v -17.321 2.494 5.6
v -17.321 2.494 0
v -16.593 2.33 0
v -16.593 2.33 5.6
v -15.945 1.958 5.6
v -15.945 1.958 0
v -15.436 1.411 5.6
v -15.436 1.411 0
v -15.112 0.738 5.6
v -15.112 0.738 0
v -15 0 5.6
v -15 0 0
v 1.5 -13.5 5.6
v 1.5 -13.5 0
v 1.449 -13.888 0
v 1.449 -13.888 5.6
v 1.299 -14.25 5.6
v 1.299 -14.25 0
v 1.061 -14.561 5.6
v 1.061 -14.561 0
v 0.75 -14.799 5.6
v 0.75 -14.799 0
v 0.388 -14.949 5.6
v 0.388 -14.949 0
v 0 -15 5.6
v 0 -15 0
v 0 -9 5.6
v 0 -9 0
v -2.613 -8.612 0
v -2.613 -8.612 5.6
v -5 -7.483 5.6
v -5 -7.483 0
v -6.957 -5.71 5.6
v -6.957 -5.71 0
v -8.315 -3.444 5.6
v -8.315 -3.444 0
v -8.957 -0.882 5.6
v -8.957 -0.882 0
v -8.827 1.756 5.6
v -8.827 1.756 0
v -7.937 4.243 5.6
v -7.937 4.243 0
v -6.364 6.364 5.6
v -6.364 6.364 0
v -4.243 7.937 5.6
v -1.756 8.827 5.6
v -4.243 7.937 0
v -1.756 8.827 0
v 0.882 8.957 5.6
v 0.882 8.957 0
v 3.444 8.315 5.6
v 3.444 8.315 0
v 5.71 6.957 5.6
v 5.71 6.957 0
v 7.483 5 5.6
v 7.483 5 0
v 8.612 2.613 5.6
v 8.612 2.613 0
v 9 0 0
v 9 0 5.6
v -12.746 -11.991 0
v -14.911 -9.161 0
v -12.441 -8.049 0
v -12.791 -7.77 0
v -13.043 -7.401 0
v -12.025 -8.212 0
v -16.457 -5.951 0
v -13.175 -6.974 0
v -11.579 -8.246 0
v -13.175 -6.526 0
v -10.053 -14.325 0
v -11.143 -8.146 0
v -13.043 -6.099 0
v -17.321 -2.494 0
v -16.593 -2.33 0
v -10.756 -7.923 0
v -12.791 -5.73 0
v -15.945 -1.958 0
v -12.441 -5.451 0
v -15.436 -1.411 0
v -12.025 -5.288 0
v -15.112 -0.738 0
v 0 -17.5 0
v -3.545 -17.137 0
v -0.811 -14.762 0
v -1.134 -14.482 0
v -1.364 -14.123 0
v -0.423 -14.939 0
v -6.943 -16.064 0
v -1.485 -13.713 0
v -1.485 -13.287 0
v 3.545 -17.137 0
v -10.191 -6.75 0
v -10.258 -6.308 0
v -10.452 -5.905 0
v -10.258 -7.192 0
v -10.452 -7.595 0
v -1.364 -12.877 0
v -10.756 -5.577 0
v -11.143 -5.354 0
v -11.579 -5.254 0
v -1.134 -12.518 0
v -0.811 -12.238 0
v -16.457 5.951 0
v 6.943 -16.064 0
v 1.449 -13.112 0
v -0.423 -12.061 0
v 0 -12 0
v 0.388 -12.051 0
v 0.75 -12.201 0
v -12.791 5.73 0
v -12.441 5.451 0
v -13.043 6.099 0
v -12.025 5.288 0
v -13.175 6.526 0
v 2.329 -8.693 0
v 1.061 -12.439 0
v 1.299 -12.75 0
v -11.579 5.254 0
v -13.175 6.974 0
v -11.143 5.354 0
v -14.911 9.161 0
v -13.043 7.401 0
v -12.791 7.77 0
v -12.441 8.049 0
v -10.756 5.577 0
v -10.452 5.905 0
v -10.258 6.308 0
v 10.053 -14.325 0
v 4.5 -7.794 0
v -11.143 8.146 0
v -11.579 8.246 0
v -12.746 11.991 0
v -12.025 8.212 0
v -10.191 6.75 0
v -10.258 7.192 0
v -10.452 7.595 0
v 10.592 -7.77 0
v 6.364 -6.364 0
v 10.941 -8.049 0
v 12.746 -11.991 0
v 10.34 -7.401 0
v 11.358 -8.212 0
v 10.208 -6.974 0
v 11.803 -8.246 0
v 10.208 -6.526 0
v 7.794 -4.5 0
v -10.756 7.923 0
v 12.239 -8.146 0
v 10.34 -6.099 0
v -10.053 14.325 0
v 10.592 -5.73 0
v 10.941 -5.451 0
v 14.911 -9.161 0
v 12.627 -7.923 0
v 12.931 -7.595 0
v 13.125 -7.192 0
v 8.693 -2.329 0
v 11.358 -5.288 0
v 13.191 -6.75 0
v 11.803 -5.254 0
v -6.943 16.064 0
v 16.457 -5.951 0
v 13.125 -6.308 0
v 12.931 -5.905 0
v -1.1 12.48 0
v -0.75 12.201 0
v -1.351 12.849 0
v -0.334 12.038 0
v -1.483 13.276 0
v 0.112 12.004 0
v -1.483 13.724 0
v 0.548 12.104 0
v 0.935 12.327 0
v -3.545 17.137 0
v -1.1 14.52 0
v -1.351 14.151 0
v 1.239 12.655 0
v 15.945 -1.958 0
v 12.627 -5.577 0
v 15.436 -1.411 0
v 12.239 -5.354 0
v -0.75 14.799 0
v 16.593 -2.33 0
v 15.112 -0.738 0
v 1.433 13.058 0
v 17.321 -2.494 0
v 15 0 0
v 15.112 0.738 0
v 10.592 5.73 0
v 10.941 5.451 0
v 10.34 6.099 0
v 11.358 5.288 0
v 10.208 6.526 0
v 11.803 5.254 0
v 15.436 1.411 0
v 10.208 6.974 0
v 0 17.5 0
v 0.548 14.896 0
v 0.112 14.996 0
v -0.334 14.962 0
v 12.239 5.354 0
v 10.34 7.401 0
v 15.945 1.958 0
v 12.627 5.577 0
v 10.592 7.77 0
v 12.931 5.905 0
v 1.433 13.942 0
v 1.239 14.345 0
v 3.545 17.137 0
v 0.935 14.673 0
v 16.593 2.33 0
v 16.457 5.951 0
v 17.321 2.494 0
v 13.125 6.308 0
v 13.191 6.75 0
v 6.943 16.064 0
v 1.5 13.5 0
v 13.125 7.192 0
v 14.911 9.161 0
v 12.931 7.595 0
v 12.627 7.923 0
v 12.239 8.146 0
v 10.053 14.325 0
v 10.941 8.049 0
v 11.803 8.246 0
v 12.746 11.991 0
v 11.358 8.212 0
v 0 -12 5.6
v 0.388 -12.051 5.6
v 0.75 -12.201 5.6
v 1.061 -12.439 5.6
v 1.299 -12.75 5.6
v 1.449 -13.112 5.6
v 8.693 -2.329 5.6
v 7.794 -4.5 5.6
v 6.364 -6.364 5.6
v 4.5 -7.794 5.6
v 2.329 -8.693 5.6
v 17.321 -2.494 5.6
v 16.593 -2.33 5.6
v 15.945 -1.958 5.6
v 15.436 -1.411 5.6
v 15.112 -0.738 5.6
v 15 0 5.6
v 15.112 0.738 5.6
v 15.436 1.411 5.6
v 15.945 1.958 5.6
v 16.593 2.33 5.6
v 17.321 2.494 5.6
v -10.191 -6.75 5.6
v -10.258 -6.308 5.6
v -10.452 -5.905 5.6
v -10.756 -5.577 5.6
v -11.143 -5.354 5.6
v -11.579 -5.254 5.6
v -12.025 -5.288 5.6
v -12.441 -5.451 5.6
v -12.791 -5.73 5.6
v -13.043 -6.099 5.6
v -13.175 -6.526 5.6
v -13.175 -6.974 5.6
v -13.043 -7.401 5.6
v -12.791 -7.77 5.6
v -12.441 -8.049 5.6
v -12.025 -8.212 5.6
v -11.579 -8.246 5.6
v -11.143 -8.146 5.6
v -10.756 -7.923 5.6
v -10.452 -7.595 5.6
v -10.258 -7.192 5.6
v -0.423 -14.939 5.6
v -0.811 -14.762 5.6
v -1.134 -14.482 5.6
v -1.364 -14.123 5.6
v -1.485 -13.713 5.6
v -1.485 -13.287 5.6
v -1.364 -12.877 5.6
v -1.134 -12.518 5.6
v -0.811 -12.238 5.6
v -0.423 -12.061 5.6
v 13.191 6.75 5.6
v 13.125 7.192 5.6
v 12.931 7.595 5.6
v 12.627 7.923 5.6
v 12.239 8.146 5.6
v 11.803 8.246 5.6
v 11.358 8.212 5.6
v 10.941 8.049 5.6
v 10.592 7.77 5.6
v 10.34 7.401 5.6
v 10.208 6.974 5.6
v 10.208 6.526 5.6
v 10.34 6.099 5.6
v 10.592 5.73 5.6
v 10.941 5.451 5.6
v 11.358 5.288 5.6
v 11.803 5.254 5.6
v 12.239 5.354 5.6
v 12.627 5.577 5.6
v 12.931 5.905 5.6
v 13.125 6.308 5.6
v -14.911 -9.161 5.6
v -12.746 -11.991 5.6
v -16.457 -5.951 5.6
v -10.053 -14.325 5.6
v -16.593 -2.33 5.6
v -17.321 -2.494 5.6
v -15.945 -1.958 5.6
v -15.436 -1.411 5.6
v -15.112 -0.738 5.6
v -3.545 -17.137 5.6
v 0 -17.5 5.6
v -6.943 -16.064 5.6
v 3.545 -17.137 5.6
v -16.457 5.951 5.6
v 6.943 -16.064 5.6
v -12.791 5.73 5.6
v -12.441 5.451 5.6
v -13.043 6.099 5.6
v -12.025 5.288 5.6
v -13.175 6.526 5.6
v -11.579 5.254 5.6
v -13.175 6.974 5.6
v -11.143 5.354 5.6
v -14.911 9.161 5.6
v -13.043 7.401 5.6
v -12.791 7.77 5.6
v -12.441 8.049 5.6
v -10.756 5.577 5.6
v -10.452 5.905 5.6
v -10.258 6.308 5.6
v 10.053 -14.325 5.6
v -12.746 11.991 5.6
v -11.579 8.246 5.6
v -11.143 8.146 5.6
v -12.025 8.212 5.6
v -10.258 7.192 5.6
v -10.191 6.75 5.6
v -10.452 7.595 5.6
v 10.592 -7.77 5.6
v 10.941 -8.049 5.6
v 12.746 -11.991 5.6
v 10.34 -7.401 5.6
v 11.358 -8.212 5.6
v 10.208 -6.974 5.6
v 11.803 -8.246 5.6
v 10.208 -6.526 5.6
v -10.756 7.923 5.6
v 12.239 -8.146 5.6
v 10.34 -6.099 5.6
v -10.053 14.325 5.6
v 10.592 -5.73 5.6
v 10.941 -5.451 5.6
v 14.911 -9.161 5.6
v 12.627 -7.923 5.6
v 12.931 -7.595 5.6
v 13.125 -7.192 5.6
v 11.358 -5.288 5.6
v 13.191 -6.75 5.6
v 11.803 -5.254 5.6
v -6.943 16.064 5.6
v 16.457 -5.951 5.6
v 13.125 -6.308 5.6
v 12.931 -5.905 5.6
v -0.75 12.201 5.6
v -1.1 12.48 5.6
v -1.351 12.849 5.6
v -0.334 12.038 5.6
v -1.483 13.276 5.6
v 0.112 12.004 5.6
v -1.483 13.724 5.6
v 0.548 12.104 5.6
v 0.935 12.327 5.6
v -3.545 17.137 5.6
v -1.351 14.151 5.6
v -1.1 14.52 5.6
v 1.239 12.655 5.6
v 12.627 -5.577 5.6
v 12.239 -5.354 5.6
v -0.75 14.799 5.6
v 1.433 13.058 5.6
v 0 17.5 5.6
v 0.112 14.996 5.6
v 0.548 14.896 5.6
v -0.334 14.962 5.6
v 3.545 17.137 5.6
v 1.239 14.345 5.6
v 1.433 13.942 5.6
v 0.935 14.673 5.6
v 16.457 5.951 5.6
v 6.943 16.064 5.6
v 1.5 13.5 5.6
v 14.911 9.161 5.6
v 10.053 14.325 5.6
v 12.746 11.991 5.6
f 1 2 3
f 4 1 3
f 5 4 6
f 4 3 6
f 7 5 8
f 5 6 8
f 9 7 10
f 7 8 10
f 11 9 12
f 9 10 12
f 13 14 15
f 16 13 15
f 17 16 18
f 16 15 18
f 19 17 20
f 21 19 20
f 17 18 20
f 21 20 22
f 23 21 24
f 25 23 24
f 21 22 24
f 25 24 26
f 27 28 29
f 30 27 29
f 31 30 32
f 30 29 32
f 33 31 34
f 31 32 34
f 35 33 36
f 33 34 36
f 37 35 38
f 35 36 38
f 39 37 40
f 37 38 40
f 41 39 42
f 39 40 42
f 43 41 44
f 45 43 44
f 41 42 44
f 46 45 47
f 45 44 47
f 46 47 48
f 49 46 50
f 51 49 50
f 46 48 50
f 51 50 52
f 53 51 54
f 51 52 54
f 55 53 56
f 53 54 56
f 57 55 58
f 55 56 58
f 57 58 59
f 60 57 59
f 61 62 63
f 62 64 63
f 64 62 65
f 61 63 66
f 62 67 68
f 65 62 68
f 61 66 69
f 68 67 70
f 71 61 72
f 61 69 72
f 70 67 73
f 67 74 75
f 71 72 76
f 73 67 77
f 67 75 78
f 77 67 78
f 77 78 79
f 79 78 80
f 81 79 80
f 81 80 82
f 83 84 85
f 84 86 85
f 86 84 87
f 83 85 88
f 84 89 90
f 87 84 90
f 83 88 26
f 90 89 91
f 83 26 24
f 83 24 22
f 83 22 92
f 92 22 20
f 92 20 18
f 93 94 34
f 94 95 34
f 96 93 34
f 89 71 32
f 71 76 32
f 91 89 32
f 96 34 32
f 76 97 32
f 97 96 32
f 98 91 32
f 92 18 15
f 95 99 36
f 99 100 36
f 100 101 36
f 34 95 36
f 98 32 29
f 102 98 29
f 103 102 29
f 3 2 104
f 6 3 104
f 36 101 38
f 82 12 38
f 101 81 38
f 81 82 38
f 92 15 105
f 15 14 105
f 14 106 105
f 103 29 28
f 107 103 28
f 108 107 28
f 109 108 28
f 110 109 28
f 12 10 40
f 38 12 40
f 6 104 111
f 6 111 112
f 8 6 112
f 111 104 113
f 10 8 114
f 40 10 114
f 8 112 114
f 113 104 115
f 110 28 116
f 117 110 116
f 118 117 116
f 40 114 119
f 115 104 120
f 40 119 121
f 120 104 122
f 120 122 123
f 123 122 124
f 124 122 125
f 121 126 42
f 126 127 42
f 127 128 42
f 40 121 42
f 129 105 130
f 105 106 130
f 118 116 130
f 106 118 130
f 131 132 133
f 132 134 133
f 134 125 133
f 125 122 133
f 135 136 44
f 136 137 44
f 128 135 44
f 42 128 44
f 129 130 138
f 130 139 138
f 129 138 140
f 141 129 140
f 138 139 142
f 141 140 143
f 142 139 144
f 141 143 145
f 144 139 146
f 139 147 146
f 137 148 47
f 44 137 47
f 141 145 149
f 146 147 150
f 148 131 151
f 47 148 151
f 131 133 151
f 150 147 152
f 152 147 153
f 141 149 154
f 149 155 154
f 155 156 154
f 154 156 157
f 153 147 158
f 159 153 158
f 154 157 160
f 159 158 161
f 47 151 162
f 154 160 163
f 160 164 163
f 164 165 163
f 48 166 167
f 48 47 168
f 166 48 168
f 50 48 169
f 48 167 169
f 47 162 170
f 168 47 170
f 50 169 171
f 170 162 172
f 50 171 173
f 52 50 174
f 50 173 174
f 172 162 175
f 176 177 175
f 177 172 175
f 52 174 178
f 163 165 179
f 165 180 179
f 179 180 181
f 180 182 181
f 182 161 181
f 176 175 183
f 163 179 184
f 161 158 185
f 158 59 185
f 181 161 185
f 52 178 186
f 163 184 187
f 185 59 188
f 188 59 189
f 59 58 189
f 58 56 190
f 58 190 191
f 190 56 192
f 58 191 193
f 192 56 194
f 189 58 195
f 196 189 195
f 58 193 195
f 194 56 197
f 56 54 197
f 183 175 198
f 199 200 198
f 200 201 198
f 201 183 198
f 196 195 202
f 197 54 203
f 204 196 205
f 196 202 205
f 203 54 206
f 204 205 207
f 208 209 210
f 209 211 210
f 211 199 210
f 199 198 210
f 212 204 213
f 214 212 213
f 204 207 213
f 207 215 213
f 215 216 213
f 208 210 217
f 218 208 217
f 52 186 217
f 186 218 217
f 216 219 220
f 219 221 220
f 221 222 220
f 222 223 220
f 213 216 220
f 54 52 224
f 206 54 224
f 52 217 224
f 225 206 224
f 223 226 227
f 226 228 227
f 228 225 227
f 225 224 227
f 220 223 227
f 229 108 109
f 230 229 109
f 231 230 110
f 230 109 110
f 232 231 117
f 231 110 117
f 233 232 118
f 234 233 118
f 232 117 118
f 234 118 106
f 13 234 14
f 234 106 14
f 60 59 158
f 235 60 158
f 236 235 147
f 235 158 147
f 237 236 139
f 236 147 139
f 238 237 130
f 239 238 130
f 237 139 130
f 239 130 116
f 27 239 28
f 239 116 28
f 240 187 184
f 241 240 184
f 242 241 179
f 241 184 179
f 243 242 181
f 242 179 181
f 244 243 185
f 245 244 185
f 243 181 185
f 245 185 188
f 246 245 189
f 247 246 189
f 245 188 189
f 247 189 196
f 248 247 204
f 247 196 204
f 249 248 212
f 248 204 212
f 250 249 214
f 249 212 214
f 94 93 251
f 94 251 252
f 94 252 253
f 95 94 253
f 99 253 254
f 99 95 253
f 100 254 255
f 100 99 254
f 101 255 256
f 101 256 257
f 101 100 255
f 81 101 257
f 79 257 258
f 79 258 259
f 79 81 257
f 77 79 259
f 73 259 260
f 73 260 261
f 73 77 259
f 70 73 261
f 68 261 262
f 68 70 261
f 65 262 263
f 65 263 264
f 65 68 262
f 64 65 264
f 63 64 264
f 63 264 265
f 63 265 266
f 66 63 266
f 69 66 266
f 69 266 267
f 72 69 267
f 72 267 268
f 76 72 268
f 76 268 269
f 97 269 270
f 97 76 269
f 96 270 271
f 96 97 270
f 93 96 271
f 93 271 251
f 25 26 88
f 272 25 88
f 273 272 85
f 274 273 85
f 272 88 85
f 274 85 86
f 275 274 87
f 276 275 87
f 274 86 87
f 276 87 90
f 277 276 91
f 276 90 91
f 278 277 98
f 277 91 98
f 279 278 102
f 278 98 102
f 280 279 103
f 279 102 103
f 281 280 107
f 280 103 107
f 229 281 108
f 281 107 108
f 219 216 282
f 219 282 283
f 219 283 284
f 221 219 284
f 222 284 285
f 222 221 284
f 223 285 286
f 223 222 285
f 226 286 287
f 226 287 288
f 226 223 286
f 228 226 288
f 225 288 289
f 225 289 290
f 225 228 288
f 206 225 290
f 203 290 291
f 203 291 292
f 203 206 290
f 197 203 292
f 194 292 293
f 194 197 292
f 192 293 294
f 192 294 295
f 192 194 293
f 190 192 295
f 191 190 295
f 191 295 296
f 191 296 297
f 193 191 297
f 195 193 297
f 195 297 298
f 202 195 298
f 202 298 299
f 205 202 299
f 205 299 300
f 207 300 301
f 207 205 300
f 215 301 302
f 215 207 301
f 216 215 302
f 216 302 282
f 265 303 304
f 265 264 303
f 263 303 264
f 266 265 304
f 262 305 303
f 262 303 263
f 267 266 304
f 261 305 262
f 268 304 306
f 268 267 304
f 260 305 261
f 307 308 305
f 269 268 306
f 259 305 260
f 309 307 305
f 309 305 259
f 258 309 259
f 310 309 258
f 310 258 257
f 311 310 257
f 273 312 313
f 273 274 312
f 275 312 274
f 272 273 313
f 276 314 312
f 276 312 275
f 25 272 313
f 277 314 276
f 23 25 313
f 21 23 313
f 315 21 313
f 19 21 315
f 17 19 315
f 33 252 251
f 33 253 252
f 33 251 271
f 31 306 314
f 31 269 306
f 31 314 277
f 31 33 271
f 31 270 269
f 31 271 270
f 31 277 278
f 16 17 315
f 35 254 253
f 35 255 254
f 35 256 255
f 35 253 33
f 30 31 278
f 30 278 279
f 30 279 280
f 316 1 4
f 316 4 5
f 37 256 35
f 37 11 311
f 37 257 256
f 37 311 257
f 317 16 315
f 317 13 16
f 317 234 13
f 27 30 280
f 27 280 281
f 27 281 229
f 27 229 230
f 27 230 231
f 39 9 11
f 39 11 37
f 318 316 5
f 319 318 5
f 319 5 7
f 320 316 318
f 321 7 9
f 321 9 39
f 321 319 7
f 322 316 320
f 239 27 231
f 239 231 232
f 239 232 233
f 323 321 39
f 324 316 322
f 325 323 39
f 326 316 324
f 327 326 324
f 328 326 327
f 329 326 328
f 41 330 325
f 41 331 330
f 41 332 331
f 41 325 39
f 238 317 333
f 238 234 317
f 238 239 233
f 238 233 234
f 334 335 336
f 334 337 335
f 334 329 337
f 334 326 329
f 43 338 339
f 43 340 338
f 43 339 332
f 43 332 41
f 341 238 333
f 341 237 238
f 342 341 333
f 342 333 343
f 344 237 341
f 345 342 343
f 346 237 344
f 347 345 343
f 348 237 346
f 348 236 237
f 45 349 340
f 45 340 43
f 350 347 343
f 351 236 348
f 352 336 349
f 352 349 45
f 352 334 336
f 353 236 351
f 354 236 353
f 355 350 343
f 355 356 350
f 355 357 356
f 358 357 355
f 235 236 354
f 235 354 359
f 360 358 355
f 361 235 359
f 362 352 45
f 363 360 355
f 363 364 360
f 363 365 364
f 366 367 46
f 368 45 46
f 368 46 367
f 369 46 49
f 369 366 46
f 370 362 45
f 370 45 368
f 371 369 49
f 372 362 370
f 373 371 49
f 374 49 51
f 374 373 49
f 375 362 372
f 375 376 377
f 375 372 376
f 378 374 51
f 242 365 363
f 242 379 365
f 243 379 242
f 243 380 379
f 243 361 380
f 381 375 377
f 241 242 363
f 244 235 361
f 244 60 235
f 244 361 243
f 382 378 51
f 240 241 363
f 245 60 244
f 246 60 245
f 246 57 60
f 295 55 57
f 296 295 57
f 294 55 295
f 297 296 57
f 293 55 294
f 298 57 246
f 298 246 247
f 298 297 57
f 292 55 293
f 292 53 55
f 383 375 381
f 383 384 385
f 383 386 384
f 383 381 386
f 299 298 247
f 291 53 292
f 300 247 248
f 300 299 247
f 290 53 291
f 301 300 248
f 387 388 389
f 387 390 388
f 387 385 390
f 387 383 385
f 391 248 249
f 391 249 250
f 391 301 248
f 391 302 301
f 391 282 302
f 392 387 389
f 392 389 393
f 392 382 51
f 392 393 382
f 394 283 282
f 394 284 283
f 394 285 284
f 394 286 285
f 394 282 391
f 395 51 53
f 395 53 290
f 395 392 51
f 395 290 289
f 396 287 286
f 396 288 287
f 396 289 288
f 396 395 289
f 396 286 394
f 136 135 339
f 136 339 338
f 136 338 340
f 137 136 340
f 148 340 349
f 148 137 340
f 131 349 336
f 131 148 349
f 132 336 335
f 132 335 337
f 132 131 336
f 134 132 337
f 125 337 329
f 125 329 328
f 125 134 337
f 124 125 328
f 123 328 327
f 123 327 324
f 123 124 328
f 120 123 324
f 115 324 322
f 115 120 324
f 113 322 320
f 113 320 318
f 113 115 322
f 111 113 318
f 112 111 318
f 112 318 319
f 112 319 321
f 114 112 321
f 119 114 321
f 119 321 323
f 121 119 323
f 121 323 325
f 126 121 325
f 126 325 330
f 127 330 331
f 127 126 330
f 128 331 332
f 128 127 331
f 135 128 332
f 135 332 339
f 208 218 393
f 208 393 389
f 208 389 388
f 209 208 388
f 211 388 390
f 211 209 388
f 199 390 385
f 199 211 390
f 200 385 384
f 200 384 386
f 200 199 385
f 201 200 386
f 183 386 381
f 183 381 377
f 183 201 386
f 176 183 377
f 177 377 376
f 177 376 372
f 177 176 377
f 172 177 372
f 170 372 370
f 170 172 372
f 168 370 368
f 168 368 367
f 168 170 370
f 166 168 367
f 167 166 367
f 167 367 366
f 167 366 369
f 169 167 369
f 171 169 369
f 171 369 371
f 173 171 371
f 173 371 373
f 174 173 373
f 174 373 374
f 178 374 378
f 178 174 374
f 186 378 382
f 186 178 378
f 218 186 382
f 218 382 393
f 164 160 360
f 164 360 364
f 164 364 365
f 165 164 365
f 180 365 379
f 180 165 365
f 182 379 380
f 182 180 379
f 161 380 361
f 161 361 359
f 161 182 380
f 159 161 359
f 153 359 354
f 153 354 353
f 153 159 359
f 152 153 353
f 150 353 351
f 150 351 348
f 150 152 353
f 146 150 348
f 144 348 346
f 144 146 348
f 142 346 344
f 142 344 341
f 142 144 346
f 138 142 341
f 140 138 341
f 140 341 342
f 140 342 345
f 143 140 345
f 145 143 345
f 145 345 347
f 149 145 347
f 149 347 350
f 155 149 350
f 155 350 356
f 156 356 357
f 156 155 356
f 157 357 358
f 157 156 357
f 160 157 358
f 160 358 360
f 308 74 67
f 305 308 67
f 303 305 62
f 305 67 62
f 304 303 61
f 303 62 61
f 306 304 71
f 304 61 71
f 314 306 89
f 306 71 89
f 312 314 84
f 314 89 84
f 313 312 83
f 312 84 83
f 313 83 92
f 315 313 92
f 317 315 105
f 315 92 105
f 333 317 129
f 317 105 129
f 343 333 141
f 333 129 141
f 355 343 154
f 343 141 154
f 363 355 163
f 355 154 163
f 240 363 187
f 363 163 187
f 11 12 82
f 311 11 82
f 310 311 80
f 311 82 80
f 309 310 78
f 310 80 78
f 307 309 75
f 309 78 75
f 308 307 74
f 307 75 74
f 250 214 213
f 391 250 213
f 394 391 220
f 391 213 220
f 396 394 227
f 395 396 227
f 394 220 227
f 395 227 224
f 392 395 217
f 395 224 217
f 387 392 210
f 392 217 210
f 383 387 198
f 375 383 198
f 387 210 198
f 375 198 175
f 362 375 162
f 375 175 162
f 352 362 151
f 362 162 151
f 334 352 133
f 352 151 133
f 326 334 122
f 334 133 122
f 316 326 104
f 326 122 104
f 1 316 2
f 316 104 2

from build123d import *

# Parameters (mm, degrees)
SKETCH_1_R      = 1.5
EXTRUDE_1_DEPTH = 5.6


with BuildPart() as part:
    # 草图1 → 凸台-拉伸1 (new body)
    with BuildSketch(Plane.XY):
        with BuildLine():
            ThreePointArc((-17.321428571, -2.493614294), (-11.45887756, -13.226644513), (0, -17.5))
            ThreePointArc((0, -17.5), (11.45887756, -13.226644513), (17.321428571, -2.493614294))
            ThreePointArc((17.321428571, -2.493614294), (15, 0), (17.321428571, 2.493614294))
            ThreePointArc((17.321428571, 2.493614294), (0, 17.5), (-17.321428571, 2.493614294))
            ThreePointArc((-17.321428571, 2.493614294), (-15.670187363, 1.70346286), (-15, 0))
            ThreePointArc((-15, 0), (-15.670187363, -1.70346286), (-17.321428571, -2.493614294))
        make_face()
        with Locations((-11.691342951, -6.75)):
            Circle(SKETCH_1_R, mode=Mode.SUBTRACT)
        with BuildLine():
            ThreePointArc((0, -15), (-1.5, -13.5), (0, -12))
            ThreePointArc((0, -12), (1.060660172, -12.439339828), (1.5, -13.5))
            ThreePointArc((1.5, -13.5), (1.060660172, -14.560660172), (0, -15))
        make_face(mode=Mode.SUBTRACT)
        with Locations((11.691342951, -6.75)):
            Circle(SKETCH_1_R, mode=Mode.SUBTRACT)
        with Locations((-11.691342951, 6.75)):
            Circle(SKETCH_1_R, mode=Mode.SUBTRACT)
        with BuildLine():
            ThreePointArc((9, 0), (6.363961031, -6.363961031), (0, -9))
            ThreePointArc((0, -9), (-6.363961031, 6.363961031), (9, 0))
        make_face(mode=Mode.SUBTRACT)
        with Locations((11.691342951, 6.75)):
            Circle(SKETCH_1_R, mode=Mode.SUBTRACT)
        with Locations((0, 13.5)):
            Circle(SKETCH_1_R, mode=Mode.SUBTRACT)
    extrude(amount=EXTRUDE_1_DEPTH)


solid = part.part
